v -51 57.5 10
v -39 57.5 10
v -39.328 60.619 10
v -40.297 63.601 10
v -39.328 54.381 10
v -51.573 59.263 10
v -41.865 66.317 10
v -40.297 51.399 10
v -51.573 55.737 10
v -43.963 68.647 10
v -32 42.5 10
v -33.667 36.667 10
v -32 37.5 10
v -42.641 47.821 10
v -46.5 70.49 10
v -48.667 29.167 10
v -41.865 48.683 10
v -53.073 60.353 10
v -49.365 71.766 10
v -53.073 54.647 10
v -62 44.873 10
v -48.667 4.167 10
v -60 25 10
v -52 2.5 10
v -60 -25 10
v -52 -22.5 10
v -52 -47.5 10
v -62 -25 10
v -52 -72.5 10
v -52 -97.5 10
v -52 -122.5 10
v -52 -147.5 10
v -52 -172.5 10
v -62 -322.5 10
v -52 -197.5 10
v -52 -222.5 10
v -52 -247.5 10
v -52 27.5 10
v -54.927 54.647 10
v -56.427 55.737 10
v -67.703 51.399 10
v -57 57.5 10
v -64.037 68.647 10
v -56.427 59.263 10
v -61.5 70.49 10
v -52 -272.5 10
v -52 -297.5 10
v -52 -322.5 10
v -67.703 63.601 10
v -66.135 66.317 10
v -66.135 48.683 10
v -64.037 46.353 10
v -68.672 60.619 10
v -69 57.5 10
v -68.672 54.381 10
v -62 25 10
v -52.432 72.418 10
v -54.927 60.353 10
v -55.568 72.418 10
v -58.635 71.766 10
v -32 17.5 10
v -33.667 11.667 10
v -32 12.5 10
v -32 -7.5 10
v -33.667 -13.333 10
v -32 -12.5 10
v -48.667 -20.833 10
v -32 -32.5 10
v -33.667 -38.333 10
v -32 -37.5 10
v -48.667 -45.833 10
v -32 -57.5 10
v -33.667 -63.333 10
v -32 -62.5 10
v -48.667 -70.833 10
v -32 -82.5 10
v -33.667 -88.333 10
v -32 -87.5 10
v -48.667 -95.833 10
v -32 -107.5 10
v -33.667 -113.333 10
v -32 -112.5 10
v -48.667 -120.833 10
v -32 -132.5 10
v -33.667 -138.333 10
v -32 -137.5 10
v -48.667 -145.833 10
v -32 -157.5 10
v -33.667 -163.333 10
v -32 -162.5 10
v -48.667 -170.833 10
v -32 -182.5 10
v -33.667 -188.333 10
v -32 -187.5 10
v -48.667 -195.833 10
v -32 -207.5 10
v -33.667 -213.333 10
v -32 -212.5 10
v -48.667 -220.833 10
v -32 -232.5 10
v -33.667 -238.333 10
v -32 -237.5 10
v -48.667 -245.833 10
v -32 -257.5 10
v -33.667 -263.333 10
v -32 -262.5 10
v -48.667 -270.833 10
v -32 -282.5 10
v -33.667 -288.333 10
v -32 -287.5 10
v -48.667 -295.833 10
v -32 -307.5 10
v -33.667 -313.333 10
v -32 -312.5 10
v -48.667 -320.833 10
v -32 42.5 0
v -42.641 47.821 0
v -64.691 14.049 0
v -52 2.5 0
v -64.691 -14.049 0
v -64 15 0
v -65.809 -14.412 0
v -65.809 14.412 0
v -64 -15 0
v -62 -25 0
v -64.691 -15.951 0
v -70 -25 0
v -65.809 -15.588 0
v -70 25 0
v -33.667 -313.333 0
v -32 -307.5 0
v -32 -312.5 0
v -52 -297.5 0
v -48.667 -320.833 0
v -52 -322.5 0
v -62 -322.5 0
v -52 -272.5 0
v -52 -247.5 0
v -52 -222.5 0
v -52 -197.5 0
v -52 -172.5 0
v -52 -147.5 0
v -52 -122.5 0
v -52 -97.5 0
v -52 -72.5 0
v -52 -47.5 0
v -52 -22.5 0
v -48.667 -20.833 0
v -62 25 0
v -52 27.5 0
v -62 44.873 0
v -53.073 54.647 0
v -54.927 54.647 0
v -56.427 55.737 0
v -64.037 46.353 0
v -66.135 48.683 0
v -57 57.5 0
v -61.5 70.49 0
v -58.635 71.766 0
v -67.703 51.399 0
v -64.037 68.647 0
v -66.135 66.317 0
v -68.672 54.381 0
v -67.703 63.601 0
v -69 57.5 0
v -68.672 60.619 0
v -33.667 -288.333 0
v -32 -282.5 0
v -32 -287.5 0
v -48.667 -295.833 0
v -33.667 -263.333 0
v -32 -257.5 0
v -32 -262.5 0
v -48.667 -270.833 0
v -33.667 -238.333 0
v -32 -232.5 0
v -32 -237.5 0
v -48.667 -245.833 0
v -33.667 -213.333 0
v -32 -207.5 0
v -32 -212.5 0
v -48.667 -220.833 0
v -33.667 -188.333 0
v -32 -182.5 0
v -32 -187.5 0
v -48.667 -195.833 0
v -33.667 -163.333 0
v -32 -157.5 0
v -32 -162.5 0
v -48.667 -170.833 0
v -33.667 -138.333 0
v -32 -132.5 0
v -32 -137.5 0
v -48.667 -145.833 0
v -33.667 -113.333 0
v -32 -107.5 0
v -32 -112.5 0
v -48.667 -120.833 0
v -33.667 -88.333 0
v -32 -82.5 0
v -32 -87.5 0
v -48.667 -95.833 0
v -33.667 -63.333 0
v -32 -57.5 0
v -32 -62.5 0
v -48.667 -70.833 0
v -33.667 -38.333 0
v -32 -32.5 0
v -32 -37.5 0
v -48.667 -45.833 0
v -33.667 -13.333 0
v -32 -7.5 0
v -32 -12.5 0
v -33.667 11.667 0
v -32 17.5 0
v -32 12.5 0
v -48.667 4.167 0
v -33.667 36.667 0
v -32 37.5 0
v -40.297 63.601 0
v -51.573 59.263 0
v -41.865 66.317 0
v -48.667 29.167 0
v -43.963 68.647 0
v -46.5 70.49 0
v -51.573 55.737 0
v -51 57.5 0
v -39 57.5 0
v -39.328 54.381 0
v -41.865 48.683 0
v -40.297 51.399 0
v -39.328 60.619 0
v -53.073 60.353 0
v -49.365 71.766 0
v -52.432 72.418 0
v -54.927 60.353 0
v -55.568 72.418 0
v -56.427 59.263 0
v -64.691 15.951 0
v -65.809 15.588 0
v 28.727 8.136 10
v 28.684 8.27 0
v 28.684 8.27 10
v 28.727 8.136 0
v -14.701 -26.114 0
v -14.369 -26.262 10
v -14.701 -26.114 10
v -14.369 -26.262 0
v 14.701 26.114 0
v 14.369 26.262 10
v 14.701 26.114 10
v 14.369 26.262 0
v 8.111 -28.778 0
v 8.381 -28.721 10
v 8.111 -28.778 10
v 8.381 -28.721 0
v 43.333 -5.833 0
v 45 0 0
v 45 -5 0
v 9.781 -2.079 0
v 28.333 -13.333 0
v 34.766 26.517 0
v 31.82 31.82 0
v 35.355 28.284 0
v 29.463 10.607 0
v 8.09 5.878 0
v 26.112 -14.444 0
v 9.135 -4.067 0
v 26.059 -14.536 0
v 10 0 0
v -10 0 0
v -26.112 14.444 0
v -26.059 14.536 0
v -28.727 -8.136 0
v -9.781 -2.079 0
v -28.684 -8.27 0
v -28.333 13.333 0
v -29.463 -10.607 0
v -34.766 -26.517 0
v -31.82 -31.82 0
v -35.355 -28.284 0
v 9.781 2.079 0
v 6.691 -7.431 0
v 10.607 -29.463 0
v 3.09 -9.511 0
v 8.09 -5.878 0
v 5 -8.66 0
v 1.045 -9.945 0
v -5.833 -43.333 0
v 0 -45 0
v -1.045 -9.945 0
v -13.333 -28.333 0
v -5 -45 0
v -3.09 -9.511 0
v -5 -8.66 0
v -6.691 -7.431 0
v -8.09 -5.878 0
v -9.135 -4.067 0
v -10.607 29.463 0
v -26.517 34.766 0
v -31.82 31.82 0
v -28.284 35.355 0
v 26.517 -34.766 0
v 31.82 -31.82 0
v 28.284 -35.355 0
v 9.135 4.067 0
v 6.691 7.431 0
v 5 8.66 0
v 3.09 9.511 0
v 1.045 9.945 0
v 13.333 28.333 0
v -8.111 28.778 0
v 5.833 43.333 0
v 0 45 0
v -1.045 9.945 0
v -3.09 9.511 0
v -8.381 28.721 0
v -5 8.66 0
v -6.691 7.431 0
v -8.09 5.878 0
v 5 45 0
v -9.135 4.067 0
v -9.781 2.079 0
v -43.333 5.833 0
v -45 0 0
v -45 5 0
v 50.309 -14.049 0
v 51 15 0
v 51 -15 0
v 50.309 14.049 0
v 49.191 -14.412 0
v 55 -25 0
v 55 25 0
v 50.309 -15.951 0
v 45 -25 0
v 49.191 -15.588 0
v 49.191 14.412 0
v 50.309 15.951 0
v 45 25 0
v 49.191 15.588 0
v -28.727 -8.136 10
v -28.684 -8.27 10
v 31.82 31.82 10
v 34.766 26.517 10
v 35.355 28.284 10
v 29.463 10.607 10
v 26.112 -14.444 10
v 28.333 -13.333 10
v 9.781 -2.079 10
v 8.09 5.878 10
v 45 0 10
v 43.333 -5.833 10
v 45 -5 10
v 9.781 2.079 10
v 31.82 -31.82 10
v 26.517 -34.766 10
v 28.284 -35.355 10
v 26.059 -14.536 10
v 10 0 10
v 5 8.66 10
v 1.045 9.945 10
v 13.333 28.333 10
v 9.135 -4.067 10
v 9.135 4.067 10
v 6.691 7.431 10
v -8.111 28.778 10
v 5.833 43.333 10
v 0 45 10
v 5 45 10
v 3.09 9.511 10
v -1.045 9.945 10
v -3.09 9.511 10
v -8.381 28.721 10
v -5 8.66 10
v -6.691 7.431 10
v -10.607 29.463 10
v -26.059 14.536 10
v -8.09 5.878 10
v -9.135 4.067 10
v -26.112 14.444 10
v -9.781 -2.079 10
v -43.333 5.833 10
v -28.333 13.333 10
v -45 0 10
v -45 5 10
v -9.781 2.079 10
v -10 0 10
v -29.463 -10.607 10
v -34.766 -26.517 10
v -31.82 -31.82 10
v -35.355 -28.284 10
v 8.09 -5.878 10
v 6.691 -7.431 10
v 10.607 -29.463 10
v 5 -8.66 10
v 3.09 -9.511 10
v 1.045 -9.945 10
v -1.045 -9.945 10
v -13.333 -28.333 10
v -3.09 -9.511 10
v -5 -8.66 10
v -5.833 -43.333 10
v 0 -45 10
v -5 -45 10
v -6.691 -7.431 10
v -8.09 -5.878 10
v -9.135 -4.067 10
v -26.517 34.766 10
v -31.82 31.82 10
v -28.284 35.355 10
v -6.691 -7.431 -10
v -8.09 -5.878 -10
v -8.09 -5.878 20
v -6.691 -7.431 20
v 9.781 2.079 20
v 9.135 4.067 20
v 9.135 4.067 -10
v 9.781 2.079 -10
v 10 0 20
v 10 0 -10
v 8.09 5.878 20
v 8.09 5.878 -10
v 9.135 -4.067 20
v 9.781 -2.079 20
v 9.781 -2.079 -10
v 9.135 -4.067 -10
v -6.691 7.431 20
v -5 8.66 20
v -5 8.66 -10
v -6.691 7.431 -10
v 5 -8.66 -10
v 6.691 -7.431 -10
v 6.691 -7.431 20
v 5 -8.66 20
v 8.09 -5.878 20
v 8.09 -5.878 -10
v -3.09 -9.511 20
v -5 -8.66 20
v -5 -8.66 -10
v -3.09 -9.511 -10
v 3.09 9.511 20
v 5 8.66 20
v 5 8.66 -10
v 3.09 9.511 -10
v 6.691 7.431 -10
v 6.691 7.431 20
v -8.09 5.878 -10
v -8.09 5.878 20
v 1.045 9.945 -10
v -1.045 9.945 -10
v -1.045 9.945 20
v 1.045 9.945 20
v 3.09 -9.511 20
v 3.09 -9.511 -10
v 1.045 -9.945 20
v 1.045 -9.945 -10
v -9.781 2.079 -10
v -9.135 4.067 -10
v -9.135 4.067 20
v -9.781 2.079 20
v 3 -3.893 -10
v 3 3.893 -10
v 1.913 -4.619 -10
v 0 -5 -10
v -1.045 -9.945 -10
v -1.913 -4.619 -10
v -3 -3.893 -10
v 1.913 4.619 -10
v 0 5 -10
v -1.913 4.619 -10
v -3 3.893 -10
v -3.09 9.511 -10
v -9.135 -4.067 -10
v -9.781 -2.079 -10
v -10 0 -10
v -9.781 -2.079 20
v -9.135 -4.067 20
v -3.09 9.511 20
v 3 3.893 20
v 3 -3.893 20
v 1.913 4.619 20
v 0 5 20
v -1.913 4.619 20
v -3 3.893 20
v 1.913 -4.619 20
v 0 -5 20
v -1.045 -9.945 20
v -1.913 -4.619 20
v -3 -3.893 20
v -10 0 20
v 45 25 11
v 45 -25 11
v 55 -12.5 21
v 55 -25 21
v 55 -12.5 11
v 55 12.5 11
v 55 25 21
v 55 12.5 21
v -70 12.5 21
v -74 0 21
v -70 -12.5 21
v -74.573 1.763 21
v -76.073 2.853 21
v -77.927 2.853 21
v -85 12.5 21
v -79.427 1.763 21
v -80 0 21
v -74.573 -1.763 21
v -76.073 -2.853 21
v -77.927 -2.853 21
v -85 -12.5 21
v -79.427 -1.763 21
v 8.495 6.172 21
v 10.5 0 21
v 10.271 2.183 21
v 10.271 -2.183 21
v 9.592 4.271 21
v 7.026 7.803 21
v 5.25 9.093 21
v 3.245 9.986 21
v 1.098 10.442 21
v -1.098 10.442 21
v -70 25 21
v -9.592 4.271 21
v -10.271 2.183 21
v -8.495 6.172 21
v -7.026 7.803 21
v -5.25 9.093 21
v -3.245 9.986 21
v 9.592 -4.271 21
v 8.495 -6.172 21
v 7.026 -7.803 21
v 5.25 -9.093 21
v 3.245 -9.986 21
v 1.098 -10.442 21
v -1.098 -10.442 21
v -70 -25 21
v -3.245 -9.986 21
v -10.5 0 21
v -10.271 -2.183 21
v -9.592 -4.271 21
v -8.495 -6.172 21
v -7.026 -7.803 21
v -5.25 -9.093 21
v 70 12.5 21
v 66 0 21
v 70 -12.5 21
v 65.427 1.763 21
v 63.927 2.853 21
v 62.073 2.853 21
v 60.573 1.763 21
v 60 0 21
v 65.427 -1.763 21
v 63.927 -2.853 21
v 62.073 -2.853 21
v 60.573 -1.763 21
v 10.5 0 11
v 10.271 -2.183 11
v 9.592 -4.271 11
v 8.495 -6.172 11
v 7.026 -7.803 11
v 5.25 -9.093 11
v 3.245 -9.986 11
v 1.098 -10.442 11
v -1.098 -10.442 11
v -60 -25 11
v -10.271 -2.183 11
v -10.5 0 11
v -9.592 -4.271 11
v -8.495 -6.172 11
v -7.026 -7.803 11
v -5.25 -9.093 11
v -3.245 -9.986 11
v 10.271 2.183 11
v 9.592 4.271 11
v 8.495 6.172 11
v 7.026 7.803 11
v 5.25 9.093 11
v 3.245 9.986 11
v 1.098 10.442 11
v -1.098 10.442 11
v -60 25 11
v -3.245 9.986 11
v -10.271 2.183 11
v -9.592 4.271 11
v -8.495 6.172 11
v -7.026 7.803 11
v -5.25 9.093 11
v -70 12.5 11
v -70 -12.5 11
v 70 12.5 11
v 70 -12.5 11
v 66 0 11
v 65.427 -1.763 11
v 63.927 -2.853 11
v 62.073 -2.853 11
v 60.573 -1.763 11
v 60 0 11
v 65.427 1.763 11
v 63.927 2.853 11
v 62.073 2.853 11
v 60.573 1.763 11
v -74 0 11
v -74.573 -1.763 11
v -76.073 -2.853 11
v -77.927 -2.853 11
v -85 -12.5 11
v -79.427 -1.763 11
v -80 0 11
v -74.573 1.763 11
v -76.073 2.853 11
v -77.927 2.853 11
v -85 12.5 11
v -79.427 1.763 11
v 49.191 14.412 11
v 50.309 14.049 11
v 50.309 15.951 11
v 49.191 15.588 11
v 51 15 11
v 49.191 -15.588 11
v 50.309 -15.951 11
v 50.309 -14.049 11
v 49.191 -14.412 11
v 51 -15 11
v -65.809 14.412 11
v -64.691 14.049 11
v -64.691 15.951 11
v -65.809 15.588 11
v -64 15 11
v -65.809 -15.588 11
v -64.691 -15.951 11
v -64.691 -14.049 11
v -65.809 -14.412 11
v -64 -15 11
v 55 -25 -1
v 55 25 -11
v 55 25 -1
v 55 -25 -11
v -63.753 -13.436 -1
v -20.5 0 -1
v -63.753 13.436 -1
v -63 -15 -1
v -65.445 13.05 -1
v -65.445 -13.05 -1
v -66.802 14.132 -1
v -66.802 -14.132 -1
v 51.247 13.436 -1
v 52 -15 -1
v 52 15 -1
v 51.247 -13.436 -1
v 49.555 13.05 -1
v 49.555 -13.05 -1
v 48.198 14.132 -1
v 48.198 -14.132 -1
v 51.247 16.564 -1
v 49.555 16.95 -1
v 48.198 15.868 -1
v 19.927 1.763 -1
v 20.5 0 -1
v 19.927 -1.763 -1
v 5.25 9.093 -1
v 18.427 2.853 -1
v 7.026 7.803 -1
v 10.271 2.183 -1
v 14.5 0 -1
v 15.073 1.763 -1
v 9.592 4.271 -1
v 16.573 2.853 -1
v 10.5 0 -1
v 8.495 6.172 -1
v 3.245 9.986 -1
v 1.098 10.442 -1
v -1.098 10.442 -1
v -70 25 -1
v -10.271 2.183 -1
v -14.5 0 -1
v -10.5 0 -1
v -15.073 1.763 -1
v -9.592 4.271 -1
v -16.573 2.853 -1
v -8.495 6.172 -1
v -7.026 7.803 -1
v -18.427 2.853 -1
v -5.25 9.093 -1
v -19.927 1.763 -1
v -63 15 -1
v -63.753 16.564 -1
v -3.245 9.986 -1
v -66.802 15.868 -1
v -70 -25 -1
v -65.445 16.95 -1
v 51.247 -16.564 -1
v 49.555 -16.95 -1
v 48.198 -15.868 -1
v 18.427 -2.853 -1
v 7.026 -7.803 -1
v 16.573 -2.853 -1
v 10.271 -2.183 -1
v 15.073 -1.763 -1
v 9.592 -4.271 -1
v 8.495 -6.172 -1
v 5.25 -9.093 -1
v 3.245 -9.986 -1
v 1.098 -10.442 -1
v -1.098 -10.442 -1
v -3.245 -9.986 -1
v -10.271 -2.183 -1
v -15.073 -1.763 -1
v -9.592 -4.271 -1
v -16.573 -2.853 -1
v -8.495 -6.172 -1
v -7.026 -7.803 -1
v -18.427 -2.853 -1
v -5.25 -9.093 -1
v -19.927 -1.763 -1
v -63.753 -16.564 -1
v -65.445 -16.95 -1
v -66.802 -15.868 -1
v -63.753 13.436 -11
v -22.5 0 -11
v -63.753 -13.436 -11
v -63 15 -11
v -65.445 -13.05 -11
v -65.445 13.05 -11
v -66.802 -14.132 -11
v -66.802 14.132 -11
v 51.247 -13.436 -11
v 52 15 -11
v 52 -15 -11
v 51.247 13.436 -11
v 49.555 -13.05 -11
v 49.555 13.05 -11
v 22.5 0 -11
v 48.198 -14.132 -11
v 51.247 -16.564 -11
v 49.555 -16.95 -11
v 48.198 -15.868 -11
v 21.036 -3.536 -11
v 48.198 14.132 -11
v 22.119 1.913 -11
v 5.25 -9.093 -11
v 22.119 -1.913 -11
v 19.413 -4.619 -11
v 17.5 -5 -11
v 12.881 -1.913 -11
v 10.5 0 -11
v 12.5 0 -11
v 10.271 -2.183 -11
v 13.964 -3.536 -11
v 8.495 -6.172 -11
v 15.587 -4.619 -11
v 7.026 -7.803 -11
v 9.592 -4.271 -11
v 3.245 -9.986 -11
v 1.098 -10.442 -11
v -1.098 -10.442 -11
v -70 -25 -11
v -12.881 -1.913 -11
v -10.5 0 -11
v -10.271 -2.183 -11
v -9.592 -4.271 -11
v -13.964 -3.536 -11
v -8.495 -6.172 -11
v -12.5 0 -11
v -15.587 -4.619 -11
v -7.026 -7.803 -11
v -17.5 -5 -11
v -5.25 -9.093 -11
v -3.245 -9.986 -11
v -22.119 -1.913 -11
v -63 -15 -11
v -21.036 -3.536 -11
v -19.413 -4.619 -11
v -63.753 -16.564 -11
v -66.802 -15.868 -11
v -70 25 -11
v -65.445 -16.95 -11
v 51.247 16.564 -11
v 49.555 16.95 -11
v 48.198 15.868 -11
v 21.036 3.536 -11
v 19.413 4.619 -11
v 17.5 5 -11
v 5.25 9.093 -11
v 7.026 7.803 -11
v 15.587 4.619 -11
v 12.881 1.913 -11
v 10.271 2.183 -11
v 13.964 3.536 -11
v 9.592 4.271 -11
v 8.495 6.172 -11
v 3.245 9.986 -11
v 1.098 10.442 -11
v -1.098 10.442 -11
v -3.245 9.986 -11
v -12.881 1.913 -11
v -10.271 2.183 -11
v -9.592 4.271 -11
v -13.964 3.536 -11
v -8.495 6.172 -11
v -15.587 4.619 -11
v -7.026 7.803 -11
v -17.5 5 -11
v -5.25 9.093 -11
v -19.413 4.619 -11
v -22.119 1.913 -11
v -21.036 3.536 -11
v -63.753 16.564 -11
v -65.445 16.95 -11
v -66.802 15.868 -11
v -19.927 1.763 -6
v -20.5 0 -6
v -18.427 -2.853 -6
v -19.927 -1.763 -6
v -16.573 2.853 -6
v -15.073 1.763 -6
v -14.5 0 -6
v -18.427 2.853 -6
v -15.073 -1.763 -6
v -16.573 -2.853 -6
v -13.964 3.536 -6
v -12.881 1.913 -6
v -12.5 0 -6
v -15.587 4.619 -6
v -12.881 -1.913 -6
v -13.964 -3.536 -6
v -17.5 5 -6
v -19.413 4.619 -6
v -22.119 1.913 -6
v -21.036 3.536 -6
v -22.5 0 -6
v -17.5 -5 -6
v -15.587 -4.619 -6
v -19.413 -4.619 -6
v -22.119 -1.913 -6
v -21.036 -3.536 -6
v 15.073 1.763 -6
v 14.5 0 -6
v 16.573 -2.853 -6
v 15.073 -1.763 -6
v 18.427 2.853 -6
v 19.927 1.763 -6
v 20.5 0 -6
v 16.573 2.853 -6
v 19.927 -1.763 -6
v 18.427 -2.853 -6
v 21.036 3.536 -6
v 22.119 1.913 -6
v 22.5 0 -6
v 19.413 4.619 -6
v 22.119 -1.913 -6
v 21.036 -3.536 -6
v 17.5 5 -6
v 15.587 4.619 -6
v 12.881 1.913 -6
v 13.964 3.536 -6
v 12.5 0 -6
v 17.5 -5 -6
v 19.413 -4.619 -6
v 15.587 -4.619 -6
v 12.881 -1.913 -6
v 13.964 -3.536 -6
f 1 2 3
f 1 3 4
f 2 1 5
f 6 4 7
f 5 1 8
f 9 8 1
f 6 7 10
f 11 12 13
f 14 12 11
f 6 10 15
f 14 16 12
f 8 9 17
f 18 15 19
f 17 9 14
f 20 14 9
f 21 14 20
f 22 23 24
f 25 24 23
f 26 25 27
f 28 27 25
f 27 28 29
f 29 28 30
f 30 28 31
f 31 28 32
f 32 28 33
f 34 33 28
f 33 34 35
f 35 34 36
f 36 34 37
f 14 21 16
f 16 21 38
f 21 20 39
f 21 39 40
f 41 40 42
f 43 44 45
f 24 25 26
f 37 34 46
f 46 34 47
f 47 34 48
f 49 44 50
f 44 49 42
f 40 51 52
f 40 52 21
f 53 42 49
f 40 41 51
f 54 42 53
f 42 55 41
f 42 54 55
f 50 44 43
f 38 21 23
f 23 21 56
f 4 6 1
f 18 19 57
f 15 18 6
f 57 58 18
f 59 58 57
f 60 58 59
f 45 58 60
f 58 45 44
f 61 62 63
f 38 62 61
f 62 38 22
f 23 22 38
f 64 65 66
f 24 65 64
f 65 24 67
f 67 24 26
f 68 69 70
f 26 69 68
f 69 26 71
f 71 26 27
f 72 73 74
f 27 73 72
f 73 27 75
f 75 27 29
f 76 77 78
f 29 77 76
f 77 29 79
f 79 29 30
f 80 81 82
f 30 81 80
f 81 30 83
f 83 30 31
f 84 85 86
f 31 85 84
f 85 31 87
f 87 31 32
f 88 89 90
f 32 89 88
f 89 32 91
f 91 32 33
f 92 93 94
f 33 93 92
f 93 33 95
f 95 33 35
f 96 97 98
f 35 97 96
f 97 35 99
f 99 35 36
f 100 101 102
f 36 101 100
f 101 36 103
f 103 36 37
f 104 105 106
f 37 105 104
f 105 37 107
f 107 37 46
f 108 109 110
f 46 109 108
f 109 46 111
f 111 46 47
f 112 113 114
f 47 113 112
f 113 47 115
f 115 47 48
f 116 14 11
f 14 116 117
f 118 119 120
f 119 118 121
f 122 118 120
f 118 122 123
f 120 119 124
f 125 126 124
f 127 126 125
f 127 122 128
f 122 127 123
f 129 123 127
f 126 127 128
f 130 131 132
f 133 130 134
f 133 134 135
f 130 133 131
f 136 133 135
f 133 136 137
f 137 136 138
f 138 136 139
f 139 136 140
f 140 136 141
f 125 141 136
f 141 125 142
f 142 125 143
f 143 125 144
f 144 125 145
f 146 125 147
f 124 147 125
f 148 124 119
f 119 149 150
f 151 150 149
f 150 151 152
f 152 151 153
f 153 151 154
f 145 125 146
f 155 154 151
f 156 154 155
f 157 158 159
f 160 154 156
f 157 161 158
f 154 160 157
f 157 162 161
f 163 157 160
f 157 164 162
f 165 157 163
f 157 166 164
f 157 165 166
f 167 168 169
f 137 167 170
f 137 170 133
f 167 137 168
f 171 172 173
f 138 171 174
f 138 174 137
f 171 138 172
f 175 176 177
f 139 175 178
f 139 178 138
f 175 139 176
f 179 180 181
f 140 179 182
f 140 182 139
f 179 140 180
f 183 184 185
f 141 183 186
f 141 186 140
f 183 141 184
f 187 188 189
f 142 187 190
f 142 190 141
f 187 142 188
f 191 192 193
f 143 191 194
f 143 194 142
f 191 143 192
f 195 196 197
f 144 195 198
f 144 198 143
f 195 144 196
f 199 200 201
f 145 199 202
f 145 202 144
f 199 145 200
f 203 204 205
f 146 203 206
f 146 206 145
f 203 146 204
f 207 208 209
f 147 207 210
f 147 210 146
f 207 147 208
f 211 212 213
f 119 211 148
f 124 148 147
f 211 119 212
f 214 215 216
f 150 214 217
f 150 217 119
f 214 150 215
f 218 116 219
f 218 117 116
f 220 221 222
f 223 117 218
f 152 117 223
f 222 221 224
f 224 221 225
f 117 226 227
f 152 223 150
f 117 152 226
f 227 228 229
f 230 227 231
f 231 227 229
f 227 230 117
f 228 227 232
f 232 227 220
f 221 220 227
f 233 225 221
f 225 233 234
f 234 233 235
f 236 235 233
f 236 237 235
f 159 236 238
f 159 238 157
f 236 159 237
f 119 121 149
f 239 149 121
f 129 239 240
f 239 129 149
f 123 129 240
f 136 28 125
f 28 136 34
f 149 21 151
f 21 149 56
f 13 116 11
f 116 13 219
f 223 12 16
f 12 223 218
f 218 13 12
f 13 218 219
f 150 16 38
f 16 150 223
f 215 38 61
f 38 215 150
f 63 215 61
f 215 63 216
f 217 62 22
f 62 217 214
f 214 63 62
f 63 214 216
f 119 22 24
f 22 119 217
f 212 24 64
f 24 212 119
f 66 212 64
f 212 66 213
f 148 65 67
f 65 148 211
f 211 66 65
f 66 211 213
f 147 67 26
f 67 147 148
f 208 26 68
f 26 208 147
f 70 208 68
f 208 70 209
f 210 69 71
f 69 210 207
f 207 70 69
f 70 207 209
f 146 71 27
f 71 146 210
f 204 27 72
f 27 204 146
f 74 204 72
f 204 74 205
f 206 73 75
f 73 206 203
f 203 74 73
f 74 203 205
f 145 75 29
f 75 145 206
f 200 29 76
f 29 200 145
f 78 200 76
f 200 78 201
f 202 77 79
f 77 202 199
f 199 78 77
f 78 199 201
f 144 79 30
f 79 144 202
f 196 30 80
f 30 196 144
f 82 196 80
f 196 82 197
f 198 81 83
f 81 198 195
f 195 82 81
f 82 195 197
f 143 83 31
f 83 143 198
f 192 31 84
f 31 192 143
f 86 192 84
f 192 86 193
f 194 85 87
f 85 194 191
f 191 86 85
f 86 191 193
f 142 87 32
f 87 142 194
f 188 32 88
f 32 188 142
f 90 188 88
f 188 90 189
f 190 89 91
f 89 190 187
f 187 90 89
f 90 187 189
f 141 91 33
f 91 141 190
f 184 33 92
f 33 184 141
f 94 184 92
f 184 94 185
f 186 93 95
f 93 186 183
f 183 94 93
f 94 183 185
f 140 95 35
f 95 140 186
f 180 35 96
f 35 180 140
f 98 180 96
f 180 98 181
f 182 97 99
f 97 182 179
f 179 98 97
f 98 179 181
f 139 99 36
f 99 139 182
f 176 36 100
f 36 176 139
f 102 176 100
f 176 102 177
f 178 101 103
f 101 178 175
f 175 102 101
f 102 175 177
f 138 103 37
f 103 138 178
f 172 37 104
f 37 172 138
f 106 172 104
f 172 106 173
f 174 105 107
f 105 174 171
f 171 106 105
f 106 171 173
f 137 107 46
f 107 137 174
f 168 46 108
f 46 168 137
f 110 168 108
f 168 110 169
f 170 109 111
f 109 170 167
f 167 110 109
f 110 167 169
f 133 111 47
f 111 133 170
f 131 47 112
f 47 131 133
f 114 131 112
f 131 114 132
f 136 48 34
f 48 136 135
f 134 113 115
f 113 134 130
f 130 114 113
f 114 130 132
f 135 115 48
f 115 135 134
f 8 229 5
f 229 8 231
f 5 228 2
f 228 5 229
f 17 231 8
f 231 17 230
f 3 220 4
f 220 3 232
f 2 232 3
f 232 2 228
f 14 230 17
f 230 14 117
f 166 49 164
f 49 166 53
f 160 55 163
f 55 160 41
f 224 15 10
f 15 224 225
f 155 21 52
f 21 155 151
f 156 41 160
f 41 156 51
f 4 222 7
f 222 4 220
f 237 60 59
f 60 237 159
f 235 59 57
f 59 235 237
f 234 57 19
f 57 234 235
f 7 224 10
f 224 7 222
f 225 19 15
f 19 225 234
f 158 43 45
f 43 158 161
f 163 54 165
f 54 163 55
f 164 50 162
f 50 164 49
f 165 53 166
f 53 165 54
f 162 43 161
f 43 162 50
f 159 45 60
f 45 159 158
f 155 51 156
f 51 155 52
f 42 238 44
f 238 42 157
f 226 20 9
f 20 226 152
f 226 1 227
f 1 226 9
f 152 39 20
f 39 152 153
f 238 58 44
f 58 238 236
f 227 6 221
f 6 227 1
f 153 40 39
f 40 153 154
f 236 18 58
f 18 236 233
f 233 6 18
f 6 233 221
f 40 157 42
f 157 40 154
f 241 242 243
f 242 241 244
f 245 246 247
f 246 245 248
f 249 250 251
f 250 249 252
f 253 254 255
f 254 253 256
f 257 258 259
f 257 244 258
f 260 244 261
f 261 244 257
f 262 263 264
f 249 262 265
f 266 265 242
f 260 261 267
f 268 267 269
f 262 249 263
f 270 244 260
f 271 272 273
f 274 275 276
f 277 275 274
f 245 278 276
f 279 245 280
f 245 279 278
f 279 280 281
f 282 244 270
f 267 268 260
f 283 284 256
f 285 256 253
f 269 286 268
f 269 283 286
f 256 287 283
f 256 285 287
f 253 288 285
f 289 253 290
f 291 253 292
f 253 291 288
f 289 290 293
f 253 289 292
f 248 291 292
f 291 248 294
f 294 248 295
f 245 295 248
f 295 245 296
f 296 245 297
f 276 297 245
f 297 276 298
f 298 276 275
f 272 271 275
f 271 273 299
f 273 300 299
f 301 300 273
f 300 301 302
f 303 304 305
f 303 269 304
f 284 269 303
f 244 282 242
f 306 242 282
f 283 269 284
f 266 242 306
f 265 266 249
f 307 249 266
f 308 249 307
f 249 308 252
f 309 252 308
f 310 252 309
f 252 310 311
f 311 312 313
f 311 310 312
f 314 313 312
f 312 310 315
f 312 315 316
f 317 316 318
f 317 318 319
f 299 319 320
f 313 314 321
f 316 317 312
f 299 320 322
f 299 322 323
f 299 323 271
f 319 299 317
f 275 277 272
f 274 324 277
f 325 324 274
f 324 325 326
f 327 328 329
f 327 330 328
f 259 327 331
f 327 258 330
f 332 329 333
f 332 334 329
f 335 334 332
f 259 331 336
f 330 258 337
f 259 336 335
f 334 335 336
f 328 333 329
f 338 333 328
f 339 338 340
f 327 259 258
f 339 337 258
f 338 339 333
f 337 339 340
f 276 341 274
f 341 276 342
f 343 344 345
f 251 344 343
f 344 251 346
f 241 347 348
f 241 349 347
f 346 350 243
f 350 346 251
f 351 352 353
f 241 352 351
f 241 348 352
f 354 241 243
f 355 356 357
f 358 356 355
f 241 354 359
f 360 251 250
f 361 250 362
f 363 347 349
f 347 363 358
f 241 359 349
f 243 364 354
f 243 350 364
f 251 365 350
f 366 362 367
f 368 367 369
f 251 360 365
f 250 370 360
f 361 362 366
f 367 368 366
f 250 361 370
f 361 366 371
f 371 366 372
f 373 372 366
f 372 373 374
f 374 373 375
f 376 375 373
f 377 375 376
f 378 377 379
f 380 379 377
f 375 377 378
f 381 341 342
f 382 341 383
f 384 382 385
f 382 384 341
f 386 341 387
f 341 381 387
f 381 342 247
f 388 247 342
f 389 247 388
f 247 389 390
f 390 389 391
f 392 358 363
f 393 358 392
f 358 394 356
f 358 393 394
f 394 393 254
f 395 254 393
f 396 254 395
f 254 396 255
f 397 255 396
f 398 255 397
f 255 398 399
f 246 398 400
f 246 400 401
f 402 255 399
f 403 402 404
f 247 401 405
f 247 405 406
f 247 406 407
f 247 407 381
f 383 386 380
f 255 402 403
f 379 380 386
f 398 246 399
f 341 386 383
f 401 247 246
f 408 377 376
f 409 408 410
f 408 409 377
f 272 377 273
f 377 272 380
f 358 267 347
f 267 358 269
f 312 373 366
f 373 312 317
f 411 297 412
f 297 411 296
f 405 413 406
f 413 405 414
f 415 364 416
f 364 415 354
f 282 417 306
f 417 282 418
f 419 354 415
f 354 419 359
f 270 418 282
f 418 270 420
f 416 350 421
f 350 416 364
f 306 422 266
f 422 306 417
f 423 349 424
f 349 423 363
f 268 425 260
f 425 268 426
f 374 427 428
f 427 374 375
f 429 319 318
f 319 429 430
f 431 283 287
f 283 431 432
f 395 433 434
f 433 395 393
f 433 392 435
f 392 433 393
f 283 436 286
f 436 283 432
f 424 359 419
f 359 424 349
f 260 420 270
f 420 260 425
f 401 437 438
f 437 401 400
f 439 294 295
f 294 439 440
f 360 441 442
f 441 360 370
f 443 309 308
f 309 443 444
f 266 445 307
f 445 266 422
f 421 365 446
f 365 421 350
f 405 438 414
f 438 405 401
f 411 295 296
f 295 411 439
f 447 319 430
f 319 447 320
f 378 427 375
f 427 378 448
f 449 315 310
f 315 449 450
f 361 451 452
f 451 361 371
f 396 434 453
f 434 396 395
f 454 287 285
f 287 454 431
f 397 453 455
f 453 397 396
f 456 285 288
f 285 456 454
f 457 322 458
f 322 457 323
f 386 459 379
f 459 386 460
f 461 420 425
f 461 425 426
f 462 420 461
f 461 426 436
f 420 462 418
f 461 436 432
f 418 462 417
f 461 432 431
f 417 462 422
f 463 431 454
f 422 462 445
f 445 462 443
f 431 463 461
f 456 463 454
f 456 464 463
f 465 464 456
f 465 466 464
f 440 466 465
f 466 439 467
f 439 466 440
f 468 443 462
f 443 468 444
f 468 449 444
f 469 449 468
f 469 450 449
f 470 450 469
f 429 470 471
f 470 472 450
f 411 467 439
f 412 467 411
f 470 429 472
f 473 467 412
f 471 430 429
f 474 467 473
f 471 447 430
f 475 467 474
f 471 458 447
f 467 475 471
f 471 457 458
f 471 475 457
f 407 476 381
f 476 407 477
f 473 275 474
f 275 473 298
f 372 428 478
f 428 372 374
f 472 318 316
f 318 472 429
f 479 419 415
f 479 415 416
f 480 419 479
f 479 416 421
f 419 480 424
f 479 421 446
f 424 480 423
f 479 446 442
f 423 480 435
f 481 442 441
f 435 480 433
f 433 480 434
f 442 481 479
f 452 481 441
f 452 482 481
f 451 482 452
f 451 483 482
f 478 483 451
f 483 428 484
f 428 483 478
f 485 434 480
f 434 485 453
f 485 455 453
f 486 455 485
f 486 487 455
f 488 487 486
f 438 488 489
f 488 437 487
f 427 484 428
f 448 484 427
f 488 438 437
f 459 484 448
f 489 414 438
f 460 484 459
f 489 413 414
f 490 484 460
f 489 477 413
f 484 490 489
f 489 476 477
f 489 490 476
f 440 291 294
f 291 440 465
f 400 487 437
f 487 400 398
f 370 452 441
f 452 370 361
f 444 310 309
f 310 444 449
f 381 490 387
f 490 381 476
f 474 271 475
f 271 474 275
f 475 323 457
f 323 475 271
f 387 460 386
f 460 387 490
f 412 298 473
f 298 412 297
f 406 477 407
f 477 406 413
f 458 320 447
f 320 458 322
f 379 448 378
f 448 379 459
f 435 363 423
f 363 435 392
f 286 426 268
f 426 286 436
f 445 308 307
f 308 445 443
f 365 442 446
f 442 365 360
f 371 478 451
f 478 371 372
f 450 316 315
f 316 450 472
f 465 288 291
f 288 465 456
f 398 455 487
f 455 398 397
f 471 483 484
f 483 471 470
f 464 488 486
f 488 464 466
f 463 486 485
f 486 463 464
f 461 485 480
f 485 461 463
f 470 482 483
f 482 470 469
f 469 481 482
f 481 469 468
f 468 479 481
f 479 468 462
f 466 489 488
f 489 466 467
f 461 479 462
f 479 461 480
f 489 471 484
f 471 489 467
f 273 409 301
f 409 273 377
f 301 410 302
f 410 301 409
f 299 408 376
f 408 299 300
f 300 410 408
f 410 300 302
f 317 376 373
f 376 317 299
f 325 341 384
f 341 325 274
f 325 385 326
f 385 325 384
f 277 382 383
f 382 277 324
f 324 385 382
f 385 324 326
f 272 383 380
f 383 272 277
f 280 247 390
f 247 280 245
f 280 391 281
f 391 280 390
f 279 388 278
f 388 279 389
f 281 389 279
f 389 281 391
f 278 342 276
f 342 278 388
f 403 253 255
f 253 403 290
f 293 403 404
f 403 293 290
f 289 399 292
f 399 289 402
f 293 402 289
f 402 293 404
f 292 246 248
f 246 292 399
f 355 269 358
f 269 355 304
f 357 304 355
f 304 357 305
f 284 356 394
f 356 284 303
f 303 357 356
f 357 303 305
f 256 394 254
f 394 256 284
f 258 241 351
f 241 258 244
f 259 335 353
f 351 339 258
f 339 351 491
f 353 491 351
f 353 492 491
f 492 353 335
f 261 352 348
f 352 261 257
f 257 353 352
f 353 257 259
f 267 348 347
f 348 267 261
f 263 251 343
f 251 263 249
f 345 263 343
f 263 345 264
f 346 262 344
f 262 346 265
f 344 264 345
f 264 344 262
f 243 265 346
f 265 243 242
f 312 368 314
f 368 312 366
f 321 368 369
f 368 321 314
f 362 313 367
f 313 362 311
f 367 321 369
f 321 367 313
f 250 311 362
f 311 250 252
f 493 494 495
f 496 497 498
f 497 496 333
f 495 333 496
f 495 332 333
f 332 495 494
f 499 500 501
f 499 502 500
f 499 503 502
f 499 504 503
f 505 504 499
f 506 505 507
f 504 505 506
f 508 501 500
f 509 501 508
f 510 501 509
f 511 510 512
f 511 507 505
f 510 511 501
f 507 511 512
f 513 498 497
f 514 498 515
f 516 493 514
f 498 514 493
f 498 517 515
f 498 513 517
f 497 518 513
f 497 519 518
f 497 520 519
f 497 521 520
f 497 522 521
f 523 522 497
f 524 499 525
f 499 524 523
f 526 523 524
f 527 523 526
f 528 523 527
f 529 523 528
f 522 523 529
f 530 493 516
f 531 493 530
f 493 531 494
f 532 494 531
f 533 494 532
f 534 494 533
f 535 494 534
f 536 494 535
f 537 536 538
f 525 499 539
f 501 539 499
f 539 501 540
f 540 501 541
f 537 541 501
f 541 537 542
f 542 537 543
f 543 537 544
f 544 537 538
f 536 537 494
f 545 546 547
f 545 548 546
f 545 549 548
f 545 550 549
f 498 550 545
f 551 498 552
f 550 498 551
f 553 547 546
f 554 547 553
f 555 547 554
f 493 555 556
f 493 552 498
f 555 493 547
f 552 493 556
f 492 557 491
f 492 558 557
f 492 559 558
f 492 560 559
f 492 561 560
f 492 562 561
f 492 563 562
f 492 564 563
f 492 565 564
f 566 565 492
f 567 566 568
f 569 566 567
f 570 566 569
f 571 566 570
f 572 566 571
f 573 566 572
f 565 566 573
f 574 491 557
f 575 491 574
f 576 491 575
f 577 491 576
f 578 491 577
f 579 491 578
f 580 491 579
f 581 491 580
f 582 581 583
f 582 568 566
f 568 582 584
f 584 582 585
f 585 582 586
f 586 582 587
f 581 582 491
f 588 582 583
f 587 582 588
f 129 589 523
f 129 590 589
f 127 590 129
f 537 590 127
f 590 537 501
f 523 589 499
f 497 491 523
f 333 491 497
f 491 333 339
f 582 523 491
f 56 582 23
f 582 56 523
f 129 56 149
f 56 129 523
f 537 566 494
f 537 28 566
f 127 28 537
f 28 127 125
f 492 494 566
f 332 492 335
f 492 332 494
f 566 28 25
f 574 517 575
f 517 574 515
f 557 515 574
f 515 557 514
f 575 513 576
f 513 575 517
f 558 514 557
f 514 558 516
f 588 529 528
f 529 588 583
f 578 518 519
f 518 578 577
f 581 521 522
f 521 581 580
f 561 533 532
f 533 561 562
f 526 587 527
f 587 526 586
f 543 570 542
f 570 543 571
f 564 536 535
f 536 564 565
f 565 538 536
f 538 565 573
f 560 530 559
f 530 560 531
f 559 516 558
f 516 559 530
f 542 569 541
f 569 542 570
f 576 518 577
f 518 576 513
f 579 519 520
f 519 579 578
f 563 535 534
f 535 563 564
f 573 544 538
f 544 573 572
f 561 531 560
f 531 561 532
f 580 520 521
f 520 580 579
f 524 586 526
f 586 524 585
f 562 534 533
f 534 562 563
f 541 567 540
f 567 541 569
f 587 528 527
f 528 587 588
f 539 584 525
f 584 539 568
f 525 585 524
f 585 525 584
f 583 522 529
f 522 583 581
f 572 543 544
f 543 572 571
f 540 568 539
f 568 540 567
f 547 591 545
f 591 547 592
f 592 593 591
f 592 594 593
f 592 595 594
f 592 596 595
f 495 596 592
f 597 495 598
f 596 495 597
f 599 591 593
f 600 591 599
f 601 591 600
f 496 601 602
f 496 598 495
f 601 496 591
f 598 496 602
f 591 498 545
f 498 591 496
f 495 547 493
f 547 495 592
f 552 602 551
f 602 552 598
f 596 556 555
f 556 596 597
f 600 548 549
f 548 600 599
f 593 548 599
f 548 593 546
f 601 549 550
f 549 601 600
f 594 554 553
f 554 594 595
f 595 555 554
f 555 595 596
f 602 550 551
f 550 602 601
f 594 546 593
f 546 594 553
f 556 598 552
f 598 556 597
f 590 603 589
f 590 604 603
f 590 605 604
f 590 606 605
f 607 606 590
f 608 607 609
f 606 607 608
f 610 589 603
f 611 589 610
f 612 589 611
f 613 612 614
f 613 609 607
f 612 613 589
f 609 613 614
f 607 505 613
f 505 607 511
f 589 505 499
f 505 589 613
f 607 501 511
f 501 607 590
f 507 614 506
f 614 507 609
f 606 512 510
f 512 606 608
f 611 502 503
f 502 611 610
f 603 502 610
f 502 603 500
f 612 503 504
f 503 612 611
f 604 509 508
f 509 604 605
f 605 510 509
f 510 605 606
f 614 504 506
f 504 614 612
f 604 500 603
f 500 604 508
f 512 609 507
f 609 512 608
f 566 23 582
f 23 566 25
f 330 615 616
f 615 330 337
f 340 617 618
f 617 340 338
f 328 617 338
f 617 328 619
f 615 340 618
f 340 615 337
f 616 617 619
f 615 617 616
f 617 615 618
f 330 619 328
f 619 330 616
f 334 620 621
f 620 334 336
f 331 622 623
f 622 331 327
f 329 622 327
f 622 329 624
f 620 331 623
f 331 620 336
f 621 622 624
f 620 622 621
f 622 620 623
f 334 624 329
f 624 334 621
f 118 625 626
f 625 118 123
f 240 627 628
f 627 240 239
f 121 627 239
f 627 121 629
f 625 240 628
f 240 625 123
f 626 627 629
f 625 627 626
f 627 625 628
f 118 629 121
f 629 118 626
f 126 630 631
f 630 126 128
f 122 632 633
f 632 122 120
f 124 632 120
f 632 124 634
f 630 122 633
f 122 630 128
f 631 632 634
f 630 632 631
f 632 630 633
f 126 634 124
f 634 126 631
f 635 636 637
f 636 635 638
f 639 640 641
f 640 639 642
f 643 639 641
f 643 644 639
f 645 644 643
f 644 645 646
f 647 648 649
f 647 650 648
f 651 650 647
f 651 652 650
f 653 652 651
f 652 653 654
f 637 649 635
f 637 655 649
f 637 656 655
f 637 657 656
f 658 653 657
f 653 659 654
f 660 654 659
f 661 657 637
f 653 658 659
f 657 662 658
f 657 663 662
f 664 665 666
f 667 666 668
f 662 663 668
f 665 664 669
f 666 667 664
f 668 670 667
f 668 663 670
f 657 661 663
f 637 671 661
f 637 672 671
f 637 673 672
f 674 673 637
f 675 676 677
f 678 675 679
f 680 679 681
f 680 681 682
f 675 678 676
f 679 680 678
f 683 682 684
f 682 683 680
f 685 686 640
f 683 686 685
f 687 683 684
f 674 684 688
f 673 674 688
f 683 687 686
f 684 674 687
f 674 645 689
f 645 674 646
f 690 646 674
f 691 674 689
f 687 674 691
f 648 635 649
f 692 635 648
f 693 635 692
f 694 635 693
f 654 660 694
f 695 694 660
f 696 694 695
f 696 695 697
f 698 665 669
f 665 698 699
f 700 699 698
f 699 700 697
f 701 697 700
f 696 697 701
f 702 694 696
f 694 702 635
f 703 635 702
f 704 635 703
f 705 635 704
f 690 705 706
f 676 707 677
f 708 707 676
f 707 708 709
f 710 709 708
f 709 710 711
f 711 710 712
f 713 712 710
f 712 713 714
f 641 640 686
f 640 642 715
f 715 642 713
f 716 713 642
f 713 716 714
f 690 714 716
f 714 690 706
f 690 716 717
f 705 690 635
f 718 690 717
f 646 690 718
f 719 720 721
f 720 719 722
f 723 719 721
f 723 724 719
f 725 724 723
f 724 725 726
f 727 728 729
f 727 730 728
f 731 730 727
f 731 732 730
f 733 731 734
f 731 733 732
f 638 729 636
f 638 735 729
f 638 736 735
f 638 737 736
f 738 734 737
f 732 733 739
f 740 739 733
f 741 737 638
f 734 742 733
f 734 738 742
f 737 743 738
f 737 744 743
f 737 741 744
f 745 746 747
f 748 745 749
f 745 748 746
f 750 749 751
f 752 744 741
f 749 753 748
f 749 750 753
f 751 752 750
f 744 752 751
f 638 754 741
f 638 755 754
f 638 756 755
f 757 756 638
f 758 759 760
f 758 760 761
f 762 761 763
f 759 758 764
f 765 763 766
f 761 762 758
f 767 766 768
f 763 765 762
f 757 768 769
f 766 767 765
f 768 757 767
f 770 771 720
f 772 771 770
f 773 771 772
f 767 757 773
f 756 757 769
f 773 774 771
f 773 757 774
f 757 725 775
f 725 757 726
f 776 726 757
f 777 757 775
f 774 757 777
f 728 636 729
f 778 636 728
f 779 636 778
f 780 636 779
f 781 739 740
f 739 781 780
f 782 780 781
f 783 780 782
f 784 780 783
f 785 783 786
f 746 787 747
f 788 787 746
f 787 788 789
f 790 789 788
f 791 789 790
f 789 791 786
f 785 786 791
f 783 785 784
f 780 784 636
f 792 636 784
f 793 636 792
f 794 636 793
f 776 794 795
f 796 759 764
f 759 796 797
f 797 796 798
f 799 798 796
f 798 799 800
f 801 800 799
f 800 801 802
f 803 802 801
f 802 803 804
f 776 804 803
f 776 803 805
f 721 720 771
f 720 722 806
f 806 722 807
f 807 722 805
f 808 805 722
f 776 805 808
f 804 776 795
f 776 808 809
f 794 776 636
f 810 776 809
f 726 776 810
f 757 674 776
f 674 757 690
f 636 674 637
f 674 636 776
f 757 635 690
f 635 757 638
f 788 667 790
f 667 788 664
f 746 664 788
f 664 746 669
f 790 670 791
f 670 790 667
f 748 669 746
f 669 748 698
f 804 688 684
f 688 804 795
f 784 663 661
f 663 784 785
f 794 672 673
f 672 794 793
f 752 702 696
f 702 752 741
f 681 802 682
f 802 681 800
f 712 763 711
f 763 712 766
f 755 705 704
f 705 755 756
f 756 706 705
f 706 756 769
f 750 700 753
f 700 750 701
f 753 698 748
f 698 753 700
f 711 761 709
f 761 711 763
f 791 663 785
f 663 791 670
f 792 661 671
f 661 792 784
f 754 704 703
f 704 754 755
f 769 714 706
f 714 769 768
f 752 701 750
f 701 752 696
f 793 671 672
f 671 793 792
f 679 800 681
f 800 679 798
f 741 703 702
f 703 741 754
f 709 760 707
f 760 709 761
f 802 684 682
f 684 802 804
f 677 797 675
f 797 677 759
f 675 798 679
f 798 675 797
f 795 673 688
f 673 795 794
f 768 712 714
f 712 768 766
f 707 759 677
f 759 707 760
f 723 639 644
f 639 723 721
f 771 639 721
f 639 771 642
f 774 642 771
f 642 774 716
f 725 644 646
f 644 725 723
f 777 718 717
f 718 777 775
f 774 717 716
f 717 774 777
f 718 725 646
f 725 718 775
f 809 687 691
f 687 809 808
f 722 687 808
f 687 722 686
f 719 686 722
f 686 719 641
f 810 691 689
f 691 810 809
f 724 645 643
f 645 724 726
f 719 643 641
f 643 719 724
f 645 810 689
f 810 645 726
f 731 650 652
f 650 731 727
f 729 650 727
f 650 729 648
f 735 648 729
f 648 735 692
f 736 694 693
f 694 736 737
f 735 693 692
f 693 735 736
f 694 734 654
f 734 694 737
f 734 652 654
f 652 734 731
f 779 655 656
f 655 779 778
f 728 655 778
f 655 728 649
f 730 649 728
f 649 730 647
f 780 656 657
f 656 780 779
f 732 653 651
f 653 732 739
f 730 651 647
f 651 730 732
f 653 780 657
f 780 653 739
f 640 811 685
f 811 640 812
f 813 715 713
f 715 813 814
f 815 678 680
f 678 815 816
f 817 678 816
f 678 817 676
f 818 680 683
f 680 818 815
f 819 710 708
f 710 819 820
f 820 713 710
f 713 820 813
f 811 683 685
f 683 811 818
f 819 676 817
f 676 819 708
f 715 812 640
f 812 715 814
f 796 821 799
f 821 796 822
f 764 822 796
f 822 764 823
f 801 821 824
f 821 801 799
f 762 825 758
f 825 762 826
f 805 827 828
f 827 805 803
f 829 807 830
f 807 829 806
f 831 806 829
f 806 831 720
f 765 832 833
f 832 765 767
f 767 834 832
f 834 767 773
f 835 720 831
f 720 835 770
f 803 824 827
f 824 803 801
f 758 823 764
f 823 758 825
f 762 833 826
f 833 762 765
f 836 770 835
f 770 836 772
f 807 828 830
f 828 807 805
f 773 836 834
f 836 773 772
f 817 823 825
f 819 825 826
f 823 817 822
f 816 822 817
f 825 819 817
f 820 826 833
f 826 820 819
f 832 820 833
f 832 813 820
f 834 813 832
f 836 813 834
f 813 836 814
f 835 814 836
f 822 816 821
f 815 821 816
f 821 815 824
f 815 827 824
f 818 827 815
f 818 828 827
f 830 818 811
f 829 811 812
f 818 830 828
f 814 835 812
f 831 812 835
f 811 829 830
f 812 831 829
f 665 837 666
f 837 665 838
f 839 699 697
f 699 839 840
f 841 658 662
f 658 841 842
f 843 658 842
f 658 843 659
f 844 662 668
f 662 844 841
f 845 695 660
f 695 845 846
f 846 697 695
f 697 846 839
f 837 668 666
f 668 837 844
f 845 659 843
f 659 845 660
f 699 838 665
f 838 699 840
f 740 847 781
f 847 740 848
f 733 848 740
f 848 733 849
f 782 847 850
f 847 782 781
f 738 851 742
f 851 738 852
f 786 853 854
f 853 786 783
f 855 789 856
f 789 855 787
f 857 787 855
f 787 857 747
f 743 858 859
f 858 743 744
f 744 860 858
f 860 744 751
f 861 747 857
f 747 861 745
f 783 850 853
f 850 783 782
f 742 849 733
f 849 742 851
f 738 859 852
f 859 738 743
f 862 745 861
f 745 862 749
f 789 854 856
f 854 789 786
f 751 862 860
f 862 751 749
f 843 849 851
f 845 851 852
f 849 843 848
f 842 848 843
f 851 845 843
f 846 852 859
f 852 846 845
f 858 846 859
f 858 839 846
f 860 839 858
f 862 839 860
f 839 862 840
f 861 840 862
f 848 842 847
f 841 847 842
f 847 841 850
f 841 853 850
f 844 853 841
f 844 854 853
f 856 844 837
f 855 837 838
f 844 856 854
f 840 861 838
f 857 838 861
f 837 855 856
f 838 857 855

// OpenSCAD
//!OpenSCAD


//--------------------------------------
//
//      Definition des variables
//
//--------------------------------------
affiche_cage = true;
affiche_cremailliere = true;
affiche_pignon = true;
affiche_corps_cage = true;
affiche_couvercle_cage = true;
nb_dents_cremailliere = 15;
nb_dents_pignon = 8;


//--------------------------------------
//
//      module principal
//
//--------------------------------------
union(){
  if (affiche_cremailliere) {
    rotate([90, 90, 0]){
      translate([-10, -62, -52.5]){
        cremaillere(nb_dents_cremailliere);
      }
    }
  }

  if (affiche_pignon) {
    rotate([0, 0, 0]){
      translate([0, 0, 0]){
        pignon(nb_dents_pignon);
      }
    }
  }

  if (affiche_cage) {
    cage();
  }

}

//--------------------------------------
//
//      module cremailliere
//
//--------------------------------------
module cremaillere(nb_dents) {
  union(){
    for (i = [1 : abs(1) : nb_dents]) {
      Dent(i);
    }

    translate([0, 8, -5]){
      rotate([90, 0, 90]){
        difference() {
          cylinder(r1=15, r2=15, h=10, center=false);

          cylinder(r1=3, r2=3, h=10, center=false);
        }
      }
    }
  }
}


//--------------------------------------
//
//      module pignon
//
//--------------------------------------
module pignon(nb_dents) {
  union(){
    union(){
      difference() {
        union(){
          cylinder(r1=30, r2=30, h=10, center=false);
          translate([0, 0, -10]){
            cylinder(r1=10, r2=10, h=30, center=false);
          }
        }

        translate([0, 0, -20]){
          cylinder(r1=5, r2=5, h=40, center=false);
        }
      }
      translate([3, -5, -10]){
        cube([5, 10, 30], center=false);
      }
      translate([-8, -5, -10]){
        cube([5, 10, 30], center=false);
      }
    }
    for (k = [1 : abs(1) : nb_dents]) {
      rotate([0, 0, (k * (360 / nb_dents))]){
        translate([15, 15, 10]){
          rotate([0, 90, 0]){
            Dent(0);
          }
        }
      }
    }

  }
}

//--------------------------------------
//
//      module cage
//
//--------------------------------------
module cage() {
  union(){
    if (affiche_corps_cage) {
      translate([-70, -25, 11]){
        difference() {
          union(){
            difference() {
              cube([125, 50, 10], center=false);

              translate([70, 25, 0]){
                cylinder(r1=10.5, r2=10.5, h=10, center=false);
              }
            }
            translate([115, 0, -11]){
              cube([10, 50, 15], center=false);
            }
            translate([0, 0, -11]){
              cube([10, 50, 15], center=false);
            }
            translate([125, 12.5, 0]){
              difference() {
                cube([15, 25, 10], center=false);

                translate([8, 12.5, 0]){
                  cylinder(r1=3, r2=3, h=10, center=false);
                }
              }
            }
            translate([-15, 12.5, 0]){
              difference() {
                cube([15, 25, 10], center=false);

                translate([8, 12.5, 0]){
                  cylinder(r1=3, r2=3, h=10, center=false);
                }
              }
            }
          }

          translate([120, 40, -40]){
            cylinder(r1=1, r2=1, h=40, center=false);
          }
          translate([120, 10, -40]){
            cylinder(r1=1, r2=1, h=40, center=false);
          }
          translate([5, 40, -40]){
            cylinder(r1=1, r2=1, h=40, center=false);
          }
          translate([5, 10, -40]){
            cylinder(r1=1, r2=1, h=40, center=false);
          }
        }
      }
    }

    if (affiche_couvercle_cage) {
      couvercle_cage();
    }

  }
}



//--------------------------------------
//
//      module couvercle cage
//
//--------------------------------------
module couvercle_cage() {
  translate([-70, -25, -11]){
    difference() {
      cube([125, 50, 10], center=false);

      translate([70, 25, 0]){
        cylinder(r1=10.5, r2=10.5, h=10, center=false);
      }
      translate([5, 10, 0]){
        cylinder(r1=2, r2=2, h=10, center=false);
      }
      translate([5, 40, 0]){
        cylinder(r1=2, r2=2, h=10, center=false);
      }
      translate([120, 10, 0]){
        cylinder(r1=2, r2=2, h=10, center=false);
      }
      translate([120, 40, 0]){
        cylinder(r1=2, r2=2, h=10, center=false);
      }
      translate([52.5, 25, 0]){
        cylinder(r1=3, r2=3, h=10, center=false);
      }
      translate([52.5, 25, 0]){
        cylinder(r1=5, r2=5, h=5, center=false);
      }
      translate([87.5, 25, 0]){
        cylinder(r1=3, r2=3, h=10, center=false);
      }
      translate([87.5, 25, 0]){
        cylinder(r1=5, r2=5, h=5, center=false);
      }
    }
  }
}


//--------------------------------------
//
//      module dent
//
//--------------------------------------
module Dent(numero) {
  translate([0, 0, (numero * 25)]){
    union(){
      translate([0, 0, -25]){
        linear_extrude( height=10, twist=0, scale=[1, 3], center=false){
          square([10, 10], center=false);
        }
      }
      translate([0, 0, -15]){
        cube([10, 30, 5], center=false);
      }
      mirror([0,0,1]){
        linear_extrude( height=10, twist=0, scale=[1, 3], center=false){
          square([10, 10], center=false);
        }
      }
    }
  }
}
